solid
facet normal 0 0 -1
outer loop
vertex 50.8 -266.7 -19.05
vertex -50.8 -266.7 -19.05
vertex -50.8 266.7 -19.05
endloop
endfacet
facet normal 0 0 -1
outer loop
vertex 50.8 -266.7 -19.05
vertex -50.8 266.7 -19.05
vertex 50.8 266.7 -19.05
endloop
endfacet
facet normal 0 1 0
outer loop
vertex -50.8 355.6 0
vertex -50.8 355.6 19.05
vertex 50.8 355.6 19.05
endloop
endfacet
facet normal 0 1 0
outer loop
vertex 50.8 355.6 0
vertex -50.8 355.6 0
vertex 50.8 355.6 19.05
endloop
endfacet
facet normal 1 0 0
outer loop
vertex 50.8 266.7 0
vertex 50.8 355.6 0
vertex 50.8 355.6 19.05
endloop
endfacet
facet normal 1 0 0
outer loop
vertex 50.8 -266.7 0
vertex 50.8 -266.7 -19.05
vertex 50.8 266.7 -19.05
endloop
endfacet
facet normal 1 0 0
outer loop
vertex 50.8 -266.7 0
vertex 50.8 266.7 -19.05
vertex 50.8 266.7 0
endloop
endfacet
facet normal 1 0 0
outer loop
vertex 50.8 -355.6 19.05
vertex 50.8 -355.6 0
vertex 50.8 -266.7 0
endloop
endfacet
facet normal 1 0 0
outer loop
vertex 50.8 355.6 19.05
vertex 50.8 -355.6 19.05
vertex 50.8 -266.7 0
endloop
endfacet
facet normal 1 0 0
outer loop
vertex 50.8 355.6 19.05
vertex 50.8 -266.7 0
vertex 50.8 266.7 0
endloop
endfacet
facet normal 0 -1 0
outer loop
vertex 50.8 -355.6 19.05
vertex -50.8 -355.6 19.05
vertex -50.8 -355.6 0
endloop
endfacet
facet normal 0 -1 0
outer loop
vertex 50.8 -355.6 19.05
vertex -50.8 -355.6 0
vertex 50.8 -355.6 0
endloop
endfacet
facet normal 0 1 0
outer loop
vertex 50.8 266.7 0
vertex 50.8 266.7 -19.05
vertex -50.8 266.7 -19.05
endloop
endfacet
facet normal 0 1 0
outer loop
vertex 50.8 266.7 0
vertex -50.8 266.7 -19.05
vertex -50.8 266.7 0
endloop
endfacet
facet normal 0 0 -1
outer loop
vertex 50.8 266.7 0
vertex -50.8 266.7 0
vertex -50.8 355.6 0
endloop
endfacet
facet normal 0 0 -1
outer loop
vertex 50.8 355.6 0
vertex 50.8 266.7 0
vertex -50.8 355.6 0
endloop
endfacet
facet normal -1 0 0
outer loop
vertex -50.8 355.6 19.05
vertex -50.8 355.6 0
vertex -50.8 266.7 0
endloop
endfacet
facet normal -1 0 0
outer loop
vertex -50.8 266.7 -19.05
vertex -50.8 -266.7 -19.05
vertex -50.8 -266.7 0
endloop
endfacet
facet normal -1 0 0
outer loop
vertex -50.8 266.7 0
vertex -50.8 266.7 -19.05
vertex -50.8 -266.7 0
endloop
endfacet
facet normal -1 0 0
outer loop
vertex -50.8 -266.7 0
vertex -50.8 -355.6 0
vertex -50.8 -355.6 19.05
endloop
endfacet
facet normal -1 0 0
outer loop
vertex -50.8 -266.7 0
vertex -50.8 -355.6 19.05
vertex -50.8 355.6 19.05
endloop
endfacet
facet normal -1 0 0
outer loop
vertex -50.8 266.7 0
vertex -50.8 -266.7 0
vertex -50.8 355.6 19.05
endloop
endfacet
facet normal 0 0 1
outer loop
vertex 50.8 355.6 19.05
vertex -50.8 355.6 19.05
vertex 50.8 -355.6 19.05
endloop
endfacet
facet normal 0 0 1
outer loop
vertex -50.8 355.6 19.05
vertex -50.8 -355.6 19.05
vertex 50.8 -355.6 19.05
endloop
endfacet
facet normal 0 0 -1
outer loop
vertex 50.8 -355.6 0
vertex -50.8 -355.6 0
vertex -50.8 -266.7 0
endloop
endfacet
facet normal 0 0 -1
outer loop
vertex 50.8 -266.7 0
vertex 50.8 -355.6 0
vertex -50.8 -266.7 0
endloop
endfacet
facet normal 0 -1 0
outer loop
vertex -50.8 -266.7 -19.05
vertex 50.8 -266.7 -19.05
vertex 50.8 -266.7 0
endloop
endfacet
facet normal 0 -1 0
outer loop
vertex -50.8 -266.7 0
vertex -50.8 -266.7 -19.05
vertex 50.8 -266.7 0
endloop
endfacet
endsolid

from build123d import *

# Parameters (mm, degrees)
F0_W     = 101.6
F0_H     = 38.1
F1_DEPTH = 355.6
F2_W     = 88.9
F2_H     = 19.05
F3_DEPTH = 101.601


with BuildPart() as f1:
    # F0 (on Front) → F1 (new body, symmetric)
    with BuildSketch(Plane.XZ):
        Rectangle(F0_W, F0_H)
    extrude(amount=F1_DEPTH, both=True)

    # F2 (on face) → F3 (cut, through all)
    with BuildSketch(Plane.YZ.offset(50.8)):
        with Locations((311.15, -9.525)):
            Rectangle(F2_W, F2_H)
        with Locations((-311.15, -9.525)):
            Rectangle(F2_W, F2_H)
    extrude(amount=-F3_DEPTH, mode=Mode.SUBTRACT)


solid = f1.part
